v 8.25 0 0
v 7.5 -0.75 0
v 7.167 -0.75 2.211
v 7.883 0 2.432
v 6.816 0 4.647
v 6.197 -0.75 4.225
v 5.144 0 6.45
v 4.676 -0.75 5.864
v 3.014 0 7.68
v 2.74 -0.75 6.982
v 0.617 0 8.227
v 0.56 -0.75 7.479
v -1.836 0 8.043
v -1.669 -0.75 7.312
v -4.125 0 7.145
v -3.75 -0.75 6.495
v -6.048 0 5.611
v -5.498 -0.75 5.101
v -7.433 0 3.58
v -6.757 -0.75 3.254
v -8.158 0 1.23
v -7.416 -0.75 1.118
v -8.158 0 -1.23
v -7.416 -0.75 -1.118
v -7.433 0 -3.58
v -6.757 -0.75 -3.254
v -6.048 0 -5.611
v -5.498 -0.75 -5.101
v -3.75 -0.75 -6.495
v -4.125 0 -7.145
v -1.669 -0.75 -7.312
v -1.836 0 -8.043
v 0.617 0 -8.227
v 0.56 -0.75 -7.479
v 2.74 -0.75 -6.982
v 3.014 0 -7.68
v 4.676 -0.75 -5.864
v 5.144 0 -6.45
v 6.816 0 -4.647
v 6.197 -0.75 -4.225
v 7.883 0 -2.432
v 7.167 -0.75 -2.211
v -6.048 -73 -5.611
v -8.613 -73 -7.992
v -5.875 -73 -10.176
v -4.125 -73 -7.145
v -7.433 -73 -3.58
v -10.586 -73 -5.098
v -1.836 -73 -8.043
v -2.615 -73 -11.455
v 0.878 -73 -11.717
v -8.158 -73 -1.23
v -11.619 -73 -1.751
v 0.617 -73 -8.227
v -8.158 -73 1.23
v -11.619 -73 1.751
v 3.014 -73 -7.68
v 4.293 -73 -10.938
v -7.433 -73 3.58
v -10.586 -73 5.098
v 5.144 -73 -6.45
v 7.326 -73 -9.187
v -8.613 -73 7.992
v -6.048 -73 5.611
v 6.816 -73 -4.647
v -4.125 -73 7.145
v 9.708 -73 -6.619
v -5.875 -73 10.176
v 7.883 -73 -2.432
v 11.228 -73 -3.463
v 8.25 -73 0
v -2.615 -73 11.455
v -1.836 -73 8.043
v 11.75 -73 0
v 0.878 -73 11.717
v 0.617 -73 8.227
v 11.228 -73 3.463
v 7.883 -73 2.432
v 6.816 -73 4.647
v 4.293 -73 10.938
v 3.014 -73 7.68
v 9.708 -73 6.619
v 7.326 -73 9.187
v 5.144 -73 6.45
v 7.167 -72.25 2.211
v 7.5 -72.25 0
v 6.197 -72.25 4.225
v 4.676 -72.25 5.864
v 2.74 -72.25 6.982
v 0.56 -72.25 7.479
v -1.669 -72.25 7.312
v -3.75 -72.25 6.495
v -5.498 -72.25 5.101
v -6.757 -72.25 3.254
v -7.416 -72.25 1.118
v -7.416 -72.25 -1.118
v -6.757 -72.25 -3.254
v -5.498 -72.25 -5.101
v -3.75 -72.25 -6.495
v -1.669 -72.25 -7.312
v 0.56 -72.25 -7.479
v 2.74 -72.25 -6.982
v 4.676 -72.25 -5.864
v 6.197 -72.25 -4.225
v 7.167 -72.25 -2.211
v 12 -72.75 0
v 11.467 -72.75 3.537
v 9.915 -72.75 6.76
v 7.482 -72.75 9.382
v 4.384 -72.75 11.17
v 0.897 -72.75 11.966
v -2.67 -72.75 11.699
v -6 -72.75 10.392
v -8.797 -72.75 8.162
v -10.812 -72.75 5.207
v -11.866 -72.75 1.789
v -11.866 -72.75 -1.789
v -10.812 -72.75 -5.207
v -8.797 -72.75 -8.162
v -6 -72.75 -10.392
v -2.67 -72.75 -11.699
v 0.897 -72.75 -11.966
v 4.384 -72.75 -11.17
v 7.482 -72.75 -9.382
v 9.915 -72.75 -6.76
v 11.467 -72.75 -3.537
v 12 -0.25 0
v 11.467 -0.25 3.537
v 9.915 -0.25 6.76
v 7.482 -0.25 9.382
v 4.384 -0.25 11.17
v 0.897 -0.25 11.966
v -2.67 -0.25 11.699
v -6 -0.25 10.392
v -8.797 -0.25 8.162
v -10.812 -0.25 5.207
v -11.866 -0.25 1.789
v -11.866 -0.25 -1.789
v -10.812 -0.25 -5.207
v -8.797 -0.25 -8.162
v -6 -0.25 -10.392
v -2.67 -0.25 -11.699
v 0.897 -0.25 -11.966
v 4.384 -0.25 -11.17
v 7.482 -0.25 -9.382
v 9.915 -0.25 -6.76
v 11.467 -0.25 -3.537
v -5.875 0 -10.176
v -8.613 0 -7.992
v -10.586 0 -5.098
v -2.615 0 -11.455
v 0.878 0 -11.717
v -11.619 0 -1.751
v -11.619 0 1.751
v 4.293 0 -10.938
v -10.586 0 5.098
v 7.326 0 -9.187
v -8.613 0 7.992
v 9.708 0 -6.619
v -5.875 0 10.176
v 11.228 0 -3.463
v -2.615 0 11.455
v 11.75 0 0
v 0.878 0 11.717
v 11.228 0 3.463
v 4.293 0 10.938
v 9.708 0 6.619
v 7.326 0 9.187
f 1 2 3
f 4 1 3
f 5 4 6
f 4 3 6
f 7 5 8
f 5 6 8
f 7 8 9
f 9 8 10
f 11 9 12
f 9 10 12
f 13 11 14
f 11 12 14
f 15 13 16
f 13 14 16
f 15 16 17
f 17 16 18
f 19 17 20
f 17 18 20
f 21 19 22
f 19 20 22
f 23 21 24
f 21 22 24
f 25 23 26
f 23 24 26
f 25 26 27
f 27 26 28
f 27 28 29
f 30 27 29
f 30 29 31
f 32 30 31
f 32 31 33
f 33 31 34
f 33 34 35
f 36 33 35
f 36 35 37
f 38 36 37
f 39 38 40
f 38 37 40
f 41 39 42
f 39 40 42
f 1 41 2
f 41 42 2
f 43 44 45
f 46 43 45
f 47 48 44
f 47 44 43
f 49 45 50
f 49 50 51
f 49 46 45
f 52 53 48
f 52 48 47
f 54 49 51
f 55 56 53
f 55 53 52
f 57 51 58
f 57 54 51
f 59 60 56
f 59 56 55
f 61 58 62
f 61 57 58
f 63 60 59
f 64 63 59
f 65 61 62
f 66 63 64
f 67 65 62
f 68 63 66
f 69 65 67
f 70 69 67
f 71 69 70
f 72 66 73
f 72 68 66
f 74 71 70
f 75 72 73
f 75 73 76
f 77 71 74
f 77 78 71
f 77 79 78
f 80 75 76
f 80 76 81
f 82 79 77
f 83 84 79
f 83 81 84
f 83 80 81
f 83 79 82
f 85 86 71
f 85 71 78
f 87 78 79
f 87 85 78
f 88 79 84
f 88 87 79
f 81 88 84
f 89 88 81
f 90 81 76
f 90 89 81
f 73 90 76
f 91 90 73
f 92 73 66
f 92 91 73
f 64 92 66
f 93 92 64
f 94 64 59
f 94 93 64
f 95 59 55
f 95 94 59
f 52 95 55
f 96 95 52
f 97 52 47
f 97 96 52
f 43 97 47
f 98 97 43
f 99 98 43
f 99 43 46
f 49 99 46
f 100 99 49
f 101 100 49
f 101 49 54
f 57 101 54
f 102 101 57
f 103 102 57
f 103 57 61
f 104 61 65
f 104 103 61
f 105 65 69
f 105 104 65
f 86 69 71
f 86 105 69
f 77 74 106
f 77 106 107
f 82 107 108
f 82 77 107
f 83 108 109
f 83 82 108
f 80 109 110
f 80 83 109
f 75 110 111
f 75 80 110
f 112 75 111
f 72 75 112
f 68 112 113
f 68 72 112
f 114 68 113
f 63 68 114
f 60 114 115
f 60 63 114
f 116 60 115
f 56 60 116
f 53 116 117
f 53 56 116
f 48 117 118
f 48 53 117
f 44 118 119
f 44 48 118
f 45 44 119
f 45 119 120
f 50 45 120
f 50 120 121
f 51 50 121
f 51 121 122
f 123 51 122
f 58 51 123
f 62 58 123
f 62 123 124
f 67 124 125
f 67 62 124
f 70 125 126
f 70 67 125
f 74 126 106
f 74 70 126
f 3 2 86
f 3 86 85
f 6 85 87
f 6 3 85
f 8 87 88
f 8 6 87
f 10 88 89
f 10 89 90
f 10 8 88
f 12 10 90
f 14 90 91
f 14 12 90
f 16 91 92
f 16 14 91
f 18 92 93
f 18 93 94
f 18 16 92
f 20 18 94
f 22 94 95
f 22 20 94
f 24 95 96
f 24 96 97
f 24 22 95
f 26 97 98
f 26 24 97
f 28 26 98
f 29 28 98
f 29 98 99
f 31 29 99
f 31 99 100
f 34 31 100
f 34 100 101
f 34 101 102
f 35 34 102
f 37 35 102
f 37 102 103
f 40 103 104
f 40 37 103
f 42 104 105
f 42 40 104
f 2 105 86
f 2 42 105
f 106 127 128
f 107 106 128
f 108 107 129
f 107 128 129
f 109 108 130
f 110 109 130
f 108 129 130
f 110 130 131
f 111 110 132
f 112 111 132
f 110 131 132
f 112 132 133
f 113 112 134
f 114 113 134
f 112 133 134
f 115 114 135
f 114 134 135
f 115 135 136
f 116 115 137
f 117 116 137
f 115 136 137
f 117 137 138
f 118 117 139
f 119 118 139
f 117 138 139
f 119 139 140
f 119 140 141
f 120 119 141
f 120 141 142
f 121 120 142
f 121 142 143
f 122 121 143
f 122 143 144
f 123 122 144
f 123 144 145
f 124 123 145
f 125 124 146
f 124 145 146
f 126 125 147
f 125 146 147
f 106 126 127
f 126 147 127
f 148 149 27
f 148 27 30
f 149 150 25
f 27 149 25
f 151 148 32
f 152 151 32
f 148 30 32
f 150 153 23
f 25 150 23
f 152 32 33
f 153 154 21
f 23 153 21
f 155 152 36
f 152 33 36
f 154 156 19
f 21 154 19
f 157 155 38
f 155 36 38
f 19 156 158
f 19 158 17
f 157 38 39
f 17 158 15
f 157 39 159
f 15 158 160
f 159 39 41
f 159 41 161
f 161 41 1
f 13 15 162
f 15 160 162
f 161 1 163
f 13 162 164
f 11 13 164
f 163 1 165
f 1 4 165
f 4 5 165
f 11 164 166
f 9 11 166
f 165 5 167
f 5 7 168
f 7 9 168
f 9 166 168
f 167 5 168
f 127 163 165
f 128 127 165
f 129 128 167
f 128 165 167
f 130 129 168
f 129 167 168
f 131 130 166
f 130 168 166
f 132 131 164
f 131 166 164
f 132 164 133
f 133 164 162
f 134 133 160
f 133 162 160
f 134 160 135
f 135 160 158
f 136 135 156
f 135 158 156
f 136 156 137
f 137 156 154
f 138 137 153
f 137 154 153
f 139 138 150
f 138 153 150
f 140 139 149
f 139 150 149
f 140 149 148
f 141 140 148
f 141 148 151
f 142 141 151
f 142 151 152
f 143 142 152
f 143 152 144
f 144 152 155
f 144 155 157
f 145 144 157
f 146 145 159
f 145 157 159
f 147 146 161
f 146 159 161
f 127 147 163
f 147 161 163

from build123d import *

# Parameters (mm, degrees)
F0_R     = 12
F0_R_2   = 7.5
F1_DEPTH = 73
F2_SIZE  = 0.25
F3_SIZE  = 0.75


with BuildPart() as f1:
    # F0 (on Front) → F1 (new body)
    with BuildSketch(Plane.XZ):
        Circle(F0_R)
        Circle(F0_R_2, mode=Mode.SUBTRACT)
    extrude(amount=F1_DEPTH)

    # F2
    f2_edges = [f1.edges().sort_by_distance(p)[0] for p in [
        (-12, -73, 0),
        (-12, 0, 0),
    ]]
    chamfer(f2_edges, length=F2_SIZE)

    # F3
    f3_edges = [f1.edges().sort_by_distance(p)[0] for p in [
        (-7.5, -73, 0),
        (-7.5, 0, 0),
    ]]
    chamfer(f3_edges, length=F3_SIZE)


solid = f1.part
